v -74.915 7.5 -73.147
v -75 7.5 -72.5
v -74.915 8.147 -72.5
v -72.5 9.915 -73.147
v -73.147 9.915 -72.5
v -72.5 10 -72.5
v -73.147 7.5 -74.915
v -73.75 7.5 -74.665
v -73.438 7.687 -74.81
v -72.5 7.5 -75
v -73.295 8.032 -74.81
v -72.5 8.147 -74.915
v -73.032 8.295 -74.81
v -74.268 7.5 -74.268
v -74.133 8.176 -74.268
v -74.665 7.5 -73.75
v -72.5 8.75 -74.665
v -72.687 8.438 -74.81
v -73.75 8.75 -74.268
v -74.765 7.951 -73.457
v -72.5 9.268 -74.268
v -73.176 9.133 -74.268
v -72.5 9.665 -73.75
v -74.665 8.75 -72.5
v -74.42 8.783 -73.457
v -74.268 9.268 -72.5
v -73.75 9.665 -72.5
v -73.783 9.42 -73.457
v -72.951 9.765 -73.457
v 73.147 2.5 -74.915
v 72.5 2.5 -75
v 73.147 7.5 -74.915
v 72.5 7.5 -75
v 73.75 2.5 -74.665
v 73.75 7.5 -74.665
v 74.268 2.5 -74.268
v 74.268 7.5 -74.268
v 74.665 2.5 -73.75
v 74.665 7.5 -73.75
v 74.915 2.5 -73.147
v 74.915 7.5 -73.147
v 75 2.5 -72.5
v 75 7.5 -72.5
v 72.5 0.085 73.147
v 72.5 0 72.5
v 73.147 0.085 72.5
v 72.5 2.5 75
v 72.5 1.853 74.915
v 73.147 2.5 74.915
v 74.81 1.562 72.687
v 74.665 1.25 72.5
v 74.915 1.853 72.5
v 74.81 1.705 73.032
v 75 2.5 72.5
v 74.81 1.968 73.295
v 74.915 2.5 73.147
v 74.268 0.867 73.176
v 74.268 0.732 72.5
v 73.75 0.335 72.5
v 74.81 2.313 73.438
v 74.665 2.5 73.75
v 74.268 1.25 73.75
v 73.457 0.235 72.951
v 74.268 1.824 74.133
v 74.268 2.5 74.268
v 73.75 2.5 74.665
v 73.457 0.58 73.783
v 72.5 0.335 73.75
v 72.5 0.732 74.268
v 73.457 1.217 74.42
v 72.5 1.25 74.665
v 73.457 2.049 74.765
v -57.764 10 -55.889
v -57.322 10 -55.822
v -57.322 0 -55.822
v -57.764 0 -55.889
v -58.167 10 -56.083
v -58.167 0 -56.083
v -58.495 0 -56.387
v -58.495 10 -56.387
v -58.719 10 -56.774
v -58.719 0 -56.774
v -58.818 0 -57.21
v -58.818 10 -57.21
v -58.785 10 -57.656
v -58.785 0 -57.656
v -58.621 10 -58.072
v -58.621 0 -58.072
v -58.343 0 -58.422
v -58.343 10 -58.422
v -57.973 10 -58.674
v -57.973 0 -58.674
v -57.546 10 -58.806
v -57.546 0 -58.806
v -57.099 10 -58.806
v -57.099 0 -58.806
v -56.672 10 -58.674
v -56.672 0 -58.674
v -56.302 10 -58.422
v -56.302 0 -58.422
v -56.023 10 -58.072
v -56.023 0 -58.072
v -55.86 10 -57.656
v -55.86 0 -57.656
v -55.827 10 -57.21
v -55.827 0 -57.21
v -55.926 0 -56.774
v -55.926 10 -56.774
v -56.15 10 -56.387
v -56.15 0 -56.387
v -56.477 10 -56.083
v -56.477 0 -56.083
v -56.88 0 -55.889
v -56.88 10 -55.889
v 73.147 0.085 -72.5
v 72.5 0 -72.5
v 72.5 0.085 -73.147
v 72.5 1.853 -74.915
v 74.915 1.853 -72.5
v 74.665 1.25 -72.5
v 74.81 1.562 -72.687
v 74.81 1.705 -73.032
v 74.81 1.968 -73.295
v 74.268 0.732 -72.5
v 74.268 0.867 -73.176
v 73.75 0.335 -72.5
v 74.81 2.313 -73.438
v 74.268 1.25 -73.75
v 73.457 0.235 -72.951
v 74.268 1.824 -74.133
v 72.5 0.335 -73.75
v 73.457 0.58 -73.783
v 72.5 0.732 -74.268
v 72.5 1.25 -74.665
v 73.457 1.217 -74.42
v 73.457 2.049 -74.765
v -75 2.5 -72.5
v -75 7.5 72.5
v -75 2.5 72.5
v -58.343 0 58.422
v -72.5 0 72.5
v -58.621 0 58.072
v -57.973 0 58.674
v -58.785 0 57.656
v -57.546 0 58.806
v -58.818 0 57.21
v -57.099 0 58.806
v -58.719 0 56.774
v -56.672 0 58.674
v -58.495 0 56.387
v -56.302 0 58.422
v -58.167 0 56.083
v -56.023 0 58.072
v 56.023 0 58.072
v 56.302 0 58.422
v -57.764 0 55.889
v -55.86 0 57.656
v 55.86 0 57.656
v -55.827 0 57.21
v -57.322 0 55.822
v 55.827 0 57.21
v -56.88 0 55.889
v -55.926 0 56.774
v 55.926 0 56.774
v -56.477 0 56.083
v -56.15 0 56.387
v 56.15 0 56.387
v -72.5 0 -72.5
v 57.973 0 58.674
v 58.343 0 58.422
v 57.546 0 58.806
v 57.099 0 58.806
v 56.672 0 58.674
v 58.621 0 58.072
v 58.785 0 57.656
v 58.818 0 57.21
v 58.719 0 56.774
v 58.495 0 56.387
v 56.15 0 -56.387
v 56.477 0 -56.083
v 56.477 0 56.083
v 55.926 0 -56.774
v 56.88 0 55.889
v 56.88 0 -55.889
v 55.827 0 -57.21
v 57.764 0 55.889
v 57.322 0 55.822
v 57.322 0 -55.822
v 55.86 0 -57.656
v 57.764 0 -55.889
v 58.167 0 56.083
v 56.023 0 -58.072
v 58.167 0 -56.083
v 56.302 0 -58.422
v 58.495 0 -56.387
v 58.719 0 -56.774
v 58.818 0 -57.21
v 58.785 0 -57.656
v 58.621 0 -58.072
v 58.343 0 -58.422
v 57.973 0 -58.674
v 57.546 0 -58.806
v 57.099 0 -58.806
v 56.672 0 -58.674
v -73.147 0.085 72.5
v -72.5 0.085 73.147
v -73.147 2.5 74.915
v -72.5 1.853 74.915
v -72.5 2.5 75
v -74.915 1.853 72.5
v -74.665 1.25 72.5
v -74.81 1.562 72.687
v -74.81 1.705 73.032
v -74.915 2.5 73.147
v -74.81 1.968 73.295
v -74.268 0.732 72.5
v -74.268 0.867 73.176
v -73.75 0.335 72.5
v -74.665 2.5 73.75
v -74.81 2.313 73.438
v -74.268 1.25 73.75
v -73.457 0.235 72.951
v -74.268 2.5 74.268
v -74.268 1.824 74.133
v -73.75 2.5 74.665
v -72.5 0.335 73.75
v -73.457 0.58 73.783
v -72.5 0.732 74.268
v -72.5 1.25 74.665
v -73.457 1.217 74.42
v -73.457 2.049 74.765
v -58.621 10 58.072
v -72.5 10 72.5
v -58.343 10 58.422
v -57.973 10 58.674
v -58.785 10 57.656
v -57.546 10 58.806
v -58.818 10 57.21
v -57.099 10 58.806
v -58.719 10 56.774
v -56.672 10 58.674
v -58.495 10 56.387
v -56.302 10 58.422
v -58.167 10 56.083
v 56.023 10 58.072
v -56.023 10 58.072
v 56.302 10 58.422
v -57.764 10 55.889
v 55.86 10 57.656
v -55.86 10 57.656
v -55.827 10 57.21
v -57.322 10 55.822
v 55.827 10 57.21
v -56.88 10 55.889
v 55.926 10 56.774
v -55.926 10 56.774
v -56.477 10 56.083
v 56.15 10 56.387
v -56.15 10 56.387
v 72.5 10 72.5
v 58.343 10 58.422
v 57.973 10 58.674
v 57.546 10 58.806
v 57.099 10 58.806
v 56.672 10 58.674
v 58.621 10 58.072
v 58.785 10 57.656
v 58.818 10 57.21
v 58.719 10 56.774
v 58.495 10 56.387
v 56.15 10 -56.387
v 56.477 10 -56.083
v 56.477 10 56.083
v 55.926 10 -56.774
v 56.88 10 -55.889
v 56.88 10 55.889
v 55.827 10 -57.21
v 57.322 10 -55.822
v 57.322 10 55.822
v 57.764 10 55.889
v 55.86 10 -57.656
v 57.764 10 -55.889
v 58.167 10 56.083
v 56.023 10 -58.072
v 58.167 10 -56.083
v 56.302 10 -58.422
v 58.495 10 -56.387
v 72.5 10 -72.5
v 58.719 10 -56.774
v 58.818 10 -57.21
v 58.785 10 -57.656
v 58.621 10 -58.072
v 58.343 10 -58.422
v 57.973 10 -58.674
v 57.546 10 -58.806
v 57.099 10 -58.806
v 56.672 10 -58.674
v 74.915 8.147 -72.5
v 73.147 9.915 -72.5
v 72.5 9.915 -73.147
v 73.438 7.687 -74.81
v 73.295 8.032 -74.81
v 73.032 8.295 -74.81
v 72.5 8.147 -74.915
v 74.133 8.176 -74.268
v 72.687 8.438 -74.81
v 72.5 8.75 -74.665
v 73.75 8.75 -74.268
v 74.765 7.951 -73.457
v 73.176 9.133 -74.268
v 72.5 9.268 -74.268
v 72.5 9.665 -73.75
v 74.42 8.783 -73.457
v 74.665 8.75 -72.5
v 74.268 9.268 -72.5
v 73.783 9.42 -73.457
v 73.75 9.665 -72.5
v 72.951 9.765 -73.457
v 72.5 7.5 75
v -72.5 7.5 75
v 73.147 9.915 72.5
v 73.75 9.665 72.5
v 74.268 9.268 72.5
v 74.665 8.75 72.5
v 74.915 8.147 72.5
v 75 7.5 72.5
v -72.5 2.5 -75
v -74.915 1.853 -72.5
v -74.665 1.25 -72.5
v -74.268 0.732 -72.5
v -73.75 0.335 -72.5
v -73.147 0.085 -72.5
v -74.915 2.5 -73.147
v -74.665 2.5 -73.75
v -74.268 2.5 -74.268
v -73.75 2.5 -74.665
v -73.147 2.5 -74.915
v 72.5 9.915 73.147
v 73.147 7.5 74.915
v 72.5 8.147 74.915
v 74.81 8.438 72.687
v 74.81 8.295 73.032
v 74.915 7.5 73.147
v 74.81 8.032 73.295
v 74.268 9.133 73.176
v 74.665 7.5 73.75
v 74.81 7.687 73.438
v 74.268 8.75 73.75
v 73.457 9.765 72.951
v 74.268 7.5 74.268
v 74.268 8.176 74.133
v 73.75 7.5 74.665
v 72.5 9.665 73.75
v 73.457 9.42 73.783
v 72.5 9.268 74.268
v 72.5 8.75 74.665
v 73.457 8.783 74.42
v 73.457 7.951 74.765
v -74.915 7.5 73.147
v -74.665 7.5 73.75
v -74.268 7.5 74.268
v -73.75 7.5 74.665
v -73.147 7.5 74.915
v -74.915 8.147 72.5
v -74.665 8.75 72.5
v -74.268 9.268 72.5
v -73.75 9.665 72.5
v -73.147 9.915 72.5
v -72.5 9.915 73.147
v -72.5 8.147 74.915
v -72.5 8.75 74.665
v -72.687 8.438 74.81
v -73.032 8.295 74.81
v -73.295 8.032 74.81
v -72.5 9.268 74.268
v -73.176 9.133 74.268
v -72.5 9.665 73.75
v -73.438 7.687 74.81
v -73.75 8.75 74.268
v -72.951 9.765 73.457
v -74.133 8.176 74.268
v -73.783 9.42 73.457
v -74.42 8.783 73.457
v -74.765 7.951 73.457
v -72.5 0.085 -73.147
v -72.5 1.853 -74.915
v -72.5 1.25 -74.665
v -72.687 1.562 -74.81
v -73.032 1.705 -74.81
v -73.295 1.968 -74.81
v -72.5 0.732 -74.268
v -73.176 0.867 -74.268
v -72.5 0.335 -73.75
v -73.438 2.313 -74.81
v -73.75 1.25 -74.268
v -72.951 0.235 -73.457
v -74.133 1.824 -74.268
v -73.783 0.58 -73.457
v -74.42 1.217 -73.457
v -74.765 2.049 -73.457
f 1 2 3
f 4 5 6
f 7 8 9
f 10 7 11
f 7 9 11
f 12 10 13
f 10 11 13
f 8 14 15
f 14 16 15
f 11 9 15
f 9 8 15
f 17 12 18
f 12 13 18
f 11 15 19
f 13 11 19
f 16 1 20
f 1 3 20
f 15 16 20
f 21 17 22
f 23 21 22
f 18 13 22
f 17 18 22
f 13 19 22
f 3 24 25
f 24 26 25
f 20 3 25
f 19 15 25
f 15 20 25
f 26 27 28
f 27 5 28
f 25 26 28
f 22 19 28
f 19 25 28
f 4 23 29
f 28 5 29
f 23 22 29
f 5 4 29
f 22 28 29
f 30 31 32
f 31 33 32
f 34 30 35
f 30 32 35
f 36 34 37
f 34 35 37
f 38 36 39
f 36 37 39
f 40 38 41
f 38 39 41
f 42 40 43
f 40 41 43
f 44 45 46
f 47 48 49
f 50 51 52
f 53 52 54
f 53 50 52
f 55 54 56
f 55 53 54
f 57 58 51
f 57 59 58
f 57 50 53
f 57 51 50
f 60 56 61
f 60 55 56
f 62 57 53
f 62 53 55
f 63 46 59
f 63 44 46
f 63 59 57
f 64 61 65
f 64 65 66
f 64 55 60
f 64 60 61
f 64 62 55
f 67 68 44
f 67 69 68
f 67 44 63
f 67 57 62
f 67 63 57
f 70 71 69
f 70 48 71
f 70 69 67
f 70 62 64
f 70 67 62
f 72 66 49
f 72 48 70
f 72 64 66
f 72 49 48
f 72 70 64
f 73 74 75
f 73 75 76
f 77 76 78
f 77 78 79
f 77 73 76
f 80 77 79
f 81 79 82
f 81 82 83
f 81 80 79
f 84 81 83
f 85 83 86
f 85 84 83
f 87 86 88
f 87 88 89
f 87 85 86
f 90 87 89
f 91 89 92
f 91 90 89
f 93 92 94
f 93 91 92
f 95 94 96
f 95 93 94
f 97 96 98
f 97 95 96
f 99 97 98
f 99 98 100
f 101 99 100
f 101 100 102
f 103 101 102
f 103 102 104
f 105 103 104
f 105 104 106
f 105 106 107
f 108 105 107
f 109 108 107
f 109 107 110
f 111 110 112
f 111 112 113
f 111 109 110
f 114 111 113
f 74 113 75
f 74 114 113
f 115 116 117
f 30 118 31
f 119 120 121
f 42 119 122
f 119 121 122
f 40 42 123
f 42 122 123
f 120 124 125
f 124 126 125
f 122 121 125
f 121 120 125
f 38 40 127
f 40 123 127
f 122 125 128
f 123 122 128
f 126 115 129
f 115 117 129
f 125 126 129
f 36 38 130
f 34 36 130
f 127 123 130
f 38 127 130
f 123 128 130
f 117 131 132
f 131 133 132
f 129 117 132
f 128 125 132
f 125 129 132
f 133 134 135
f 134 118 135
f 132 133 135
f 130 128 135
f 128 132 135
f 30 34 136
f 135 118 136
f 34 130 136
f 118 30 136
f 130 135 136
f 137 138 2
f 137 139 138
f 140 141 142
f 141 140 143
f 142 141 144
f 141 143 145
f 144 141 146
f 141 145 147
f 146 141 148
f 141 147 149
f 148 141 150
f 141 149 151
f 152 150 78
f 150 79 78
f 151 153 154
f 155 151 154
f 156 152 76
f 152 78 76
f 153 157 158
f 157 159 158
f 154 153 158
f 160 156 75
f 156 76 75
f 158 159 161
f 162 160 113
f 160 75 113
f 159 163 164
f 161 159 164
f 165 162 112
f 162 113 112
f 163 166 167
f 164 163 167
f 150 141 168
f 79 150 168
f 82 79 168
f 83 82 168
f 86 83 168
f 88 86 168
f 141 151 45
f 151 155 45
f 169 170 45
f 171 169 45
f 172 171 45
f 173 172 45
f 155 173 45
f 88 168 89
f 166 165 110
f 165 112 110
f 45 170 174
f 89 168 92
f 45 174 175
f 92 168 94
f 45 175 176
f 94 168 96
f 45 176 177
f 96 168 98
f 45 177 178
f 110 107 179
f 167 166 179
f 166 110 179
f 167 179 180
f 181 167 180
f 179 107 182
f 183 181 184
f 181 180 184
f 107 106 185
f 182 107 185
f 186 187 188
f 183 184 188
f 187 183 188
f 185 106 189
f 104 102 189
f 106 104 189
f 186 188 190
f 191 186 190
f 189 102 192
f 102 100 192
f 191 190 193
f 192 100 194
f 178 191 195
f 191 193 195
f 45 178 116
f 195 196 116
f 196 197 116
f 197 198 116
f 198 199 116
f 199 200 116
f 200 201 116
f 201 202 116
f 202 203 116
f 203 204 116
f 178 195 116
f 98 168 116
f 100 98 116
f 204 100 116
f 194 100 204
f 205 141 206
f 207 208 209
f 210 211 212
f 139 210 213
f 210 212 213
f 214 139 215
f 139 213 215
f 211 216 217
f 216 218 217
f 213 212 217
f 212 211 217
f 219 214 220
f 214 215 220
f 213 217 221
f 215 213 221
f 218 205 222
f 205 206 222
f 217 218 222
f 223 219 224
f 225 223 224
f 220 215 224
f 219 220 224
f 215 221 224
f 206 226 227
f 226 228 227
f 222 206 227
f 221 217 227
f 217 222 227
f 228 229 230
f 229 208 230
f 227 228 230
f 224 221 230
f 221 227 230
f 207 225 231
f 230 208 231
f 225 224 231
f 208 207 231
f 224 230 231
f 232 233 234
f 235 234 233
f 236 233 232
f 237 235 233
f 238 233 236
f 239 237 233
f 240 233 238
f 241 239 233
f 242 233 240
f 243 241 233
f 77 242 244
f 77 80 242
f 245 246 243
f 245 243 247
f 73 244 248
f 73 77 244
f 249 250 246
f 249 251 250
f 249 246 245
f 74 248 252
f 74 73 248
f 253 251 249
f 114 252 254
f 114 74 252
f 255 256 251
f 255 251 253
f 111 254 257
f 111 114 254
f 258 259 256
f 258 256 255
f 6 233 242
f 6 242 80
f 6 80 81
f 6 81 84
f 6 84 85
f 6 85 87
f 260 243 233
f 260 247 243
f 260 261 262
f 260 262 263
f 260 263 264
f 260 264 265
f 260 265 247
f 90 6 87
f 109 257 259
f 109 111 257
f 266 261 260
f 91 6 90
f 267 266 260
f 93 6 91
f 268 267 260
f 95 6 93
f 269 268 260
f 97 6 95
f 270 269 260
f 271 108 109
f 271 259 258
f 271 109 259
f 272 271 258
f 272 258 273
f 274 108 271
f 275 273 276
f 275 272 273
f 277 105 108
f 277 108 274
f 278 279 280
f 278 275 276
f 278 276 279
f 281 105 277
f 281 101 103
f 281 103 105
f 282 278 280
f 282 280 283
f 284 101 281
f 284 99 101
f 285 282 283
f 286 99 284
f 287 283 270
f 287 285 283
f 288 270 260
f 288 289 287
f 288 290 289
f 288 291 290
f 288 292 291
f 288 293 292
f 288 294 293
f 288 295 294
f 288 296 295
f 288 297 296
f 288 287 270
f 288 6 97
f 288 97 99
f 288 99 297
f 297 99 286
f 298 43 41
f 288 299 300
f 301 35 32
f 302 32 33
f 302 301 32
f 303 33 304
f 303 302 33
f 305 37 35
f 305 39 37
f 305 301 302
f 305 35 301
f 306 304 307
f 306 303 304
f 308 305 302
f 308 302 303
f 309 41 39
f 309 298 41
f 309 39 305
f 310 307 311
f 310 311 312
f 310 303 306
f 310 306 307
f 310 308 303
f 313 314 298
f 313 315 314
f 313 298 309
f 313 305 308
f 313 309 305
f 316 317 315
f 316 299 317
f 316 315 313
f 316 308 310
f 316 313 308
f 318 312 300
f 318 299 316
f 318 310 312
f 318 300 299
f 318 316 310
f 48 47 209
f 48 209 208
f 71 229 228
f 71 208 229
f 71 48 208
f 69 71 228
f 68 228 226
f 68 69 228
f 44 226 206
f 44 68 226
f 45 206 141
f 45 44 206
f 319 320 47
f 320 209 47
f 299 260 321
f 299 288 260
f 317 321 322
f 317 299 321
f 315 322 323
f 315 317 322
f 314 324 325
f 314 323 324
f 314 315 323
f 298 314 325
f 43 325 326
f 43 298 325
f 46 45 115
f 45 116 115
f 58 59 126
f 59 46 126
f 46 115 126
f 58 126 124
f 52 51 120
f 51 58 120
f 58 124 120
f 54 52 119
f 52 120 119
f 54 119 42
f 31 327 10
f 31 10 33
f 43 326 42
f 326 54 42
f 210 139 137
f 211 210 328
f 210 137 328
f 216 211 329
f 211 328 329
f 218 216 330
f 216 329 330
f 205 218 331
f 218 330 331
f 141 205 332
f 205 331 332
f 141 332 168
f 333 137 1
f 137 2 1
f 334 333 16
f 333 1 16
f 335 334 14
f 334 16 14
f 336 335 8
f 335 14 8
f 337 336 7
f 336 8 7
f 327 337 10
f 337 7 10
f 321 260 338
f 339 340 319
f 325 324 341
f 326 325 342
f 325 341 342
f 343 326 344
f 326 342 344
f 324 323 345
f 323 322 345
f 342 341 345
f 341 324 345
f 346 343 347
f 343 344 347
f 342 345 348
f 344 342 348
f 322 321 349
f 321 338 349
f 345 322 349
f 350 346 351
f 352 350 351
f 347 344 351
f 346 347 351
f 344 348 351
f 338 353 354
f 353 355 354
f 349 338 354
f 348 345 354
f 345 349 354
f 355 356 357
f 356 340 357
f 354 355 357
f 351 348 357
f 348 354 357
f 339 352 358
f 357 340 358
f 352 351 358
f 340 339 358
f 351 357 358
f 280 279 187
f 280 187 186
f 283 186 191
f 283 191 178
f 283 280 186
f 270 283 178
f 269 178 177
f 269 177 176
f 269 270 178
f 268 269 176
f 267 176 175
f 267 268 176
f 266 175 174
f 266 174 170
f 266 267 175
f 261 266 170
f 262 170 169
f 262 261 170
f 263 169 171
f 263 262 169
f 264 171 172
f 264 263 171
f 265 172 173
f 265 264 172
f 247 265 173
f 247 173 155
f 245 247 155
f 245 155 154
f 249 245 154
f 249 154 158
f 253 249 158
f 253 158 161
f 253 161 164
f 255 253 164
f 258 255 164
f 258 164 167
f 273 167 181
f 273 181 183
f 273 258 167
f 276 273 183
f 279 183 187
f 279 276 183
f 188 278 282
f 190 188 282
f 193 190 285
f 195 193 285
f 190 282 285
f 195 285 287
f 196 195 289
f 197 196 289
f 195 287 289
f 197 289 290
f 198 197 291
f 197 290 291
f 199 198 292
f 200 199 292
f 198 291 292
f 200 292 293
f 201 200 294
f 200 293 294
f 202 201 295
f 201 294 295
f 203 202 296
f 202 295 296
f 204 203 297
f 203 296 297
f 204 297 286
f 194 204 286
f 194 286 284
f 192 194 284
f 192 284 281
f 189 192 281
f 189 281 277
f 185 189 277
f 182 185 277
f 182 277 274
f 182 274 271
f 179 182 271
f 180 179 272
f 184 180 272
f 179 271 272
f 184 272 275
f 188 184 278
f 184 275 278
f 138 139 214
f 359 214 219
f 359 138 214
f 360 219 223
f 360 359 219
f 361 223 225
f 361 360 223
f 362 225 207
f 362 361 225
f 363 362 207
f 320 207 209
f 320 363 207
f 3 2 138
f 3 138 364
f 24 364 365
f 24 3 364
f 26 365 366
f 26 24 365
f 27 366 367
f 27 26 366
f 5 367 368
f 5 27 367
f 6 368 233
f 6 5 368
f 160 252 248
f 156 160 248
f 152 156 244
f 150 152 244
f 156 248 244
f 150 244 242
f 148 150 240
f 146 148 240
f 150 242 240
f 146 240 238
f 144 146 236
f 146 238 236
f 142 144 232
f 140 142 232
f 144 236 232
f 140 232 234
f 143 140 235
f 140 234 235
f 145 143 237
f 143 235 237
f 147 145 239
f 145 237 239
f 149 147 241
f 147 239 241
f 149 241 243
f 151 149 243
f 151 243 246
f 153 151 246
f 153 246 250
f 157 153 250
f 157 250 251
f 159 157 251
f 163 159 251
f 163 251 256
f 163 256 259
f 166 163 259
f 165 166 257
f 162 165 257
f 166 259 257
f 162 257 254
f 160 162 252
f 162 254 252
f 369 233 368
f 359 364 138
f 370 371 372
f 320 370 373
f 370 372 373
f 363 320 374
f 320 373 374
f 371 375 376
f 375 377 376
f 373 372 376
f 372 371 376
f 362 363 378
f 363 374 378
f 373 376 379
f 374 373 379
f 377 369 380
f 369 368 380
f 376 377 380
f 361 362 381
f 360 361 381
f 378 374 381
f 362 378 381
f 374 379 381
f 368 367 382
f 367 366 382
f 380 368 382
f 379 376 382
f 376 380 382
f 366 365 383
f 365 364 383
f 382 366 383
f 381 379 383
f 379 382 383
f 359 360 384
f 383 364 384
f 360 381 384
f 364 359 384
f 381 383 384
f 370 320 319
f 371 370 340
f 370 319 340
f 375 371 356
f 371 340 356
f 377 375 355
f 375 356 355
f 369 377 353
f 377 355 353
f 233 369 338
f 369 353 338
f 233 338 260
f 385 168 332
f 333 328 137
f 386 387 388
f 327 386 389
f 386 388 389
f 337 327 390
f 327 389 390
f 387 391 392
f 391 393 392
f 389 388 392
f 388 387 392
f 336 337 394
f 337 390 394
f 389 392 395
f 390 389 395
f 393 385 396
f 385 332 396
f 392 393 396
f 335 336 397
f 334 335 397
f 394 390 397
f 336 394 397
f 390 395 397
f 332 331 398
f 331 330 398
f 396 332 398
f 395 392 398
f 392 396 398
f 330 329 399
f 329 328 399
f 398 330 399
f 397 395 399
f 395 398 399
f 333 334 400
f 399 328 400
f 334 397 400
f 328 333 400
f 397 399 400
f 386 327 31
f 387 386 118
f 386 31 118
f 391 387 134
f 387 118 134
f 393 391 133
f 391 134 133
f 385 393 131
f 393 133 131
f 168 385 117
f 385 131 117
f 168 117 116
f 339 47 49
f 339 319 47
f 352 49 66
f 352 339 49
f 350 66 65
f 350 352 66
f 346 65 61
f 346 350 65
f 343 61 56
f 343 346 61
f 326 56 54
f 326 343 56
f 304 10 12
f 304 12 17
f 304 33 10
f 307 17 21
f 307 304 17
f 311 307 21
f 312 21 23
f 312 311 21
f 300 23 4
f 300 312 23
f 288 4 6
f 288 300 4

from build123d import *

# Parameters (mm, degrees)
SKETCH2_W                                  = 150
SKETCH2_H                                  = 150
BOSS_EXTRUDE1_DEPTH                        = 10
SKETCH3_R                                  = 1.5
CUT_EXTRUDE1_DEPTH                         = 10
MIRROR1_AT_THE_SECOND_PLANE_COPY_1_SKETC_R = 1.5
MIRROR1_AT_THE_SECOND_PLANE_COPY_1_DEPTH   = 10
FILLET1_R                                  = 2.5


with BuildPart() as part:
    # Sketch2 → Boss-Extrude1 (new body)
    with BuildSketch(Plane(origin=(0, 0, 0), x_dir=(1, 0, 0), z_dir=(0, 1, 0))):
        Rectangle(SKETCH2_W, SKETCH2_H)
    extrude(amount=BOSS_EXTRUDE1_DEPTH)

    # Sketch3 → Cut-Extrude1 (cut)
    with BuildSketch(Plane(origin=(0, 10, 0), x_dir=(1, 0, 0), z_dir=(0, 1, 0))):
        with Locations(Location((57.32233047, 57.32233047, 0), (0, 0, 270))):
            Circle(SKETCH3_R)
    cut_extrude1 = extrude(amount=-CUT_EXTRUDE1_DEPTH, mode=Mode.SUBTRACT)

    # Mirror1: Cut-Extrude1 across plane
    add(cut_extrude1.mirror(Plane(origin=(0, 0, 0), x_dir=(1, 0, 0), z_dir=(0, 0, -1))), mode=Mode.SUBTRACT)

    # Mirror1 at the second plane: Cut-Extrude1 across plane
    add(cut_extrude1.mirror(Plane.ZY), mode=Mode.SUBTRACT)

    # Mirror1 at the second plane copy 1 sketc → Mirror1 at the second plane copy 1 (cut)
    with BuildSketch(Plane(origin=(0, 10, 0), x_dir=(-1, 0, 0), z_dir=(0, 1, 0))):
        with Locations(Location((57.32233047, 57.32233047, 0), (0, 0, 270))):
            Circle(MIRROR1_AT_THE_SECOND_PLANE_COPY_1_SKETC_R)
    extrude(amount=-MIRROR1_AT_THE_SECOND_PLANE_COPY_1_DEPTH, mode=Mode.SUBTRACT)

    # Fillet1
    fillet1_edges = [part.edges().sort_by_distance(p)[0] for p in [
        (-75, 10, 0),
        (0, 10, 75),
        (75, 10, 0),
        (0, 0, 75),
        (-75, 0, 0),
        (0, 0, -75),
        (75, 0, 0),
        (75, 5, 75),
        (-75, 5, 75),
        (-75, 5, -75),
        (75, 5, -75),
        (0, 10, -75),
    ]]
    fillet(fillet1_edges, radius=FILLET1_R)


solid = part.part
